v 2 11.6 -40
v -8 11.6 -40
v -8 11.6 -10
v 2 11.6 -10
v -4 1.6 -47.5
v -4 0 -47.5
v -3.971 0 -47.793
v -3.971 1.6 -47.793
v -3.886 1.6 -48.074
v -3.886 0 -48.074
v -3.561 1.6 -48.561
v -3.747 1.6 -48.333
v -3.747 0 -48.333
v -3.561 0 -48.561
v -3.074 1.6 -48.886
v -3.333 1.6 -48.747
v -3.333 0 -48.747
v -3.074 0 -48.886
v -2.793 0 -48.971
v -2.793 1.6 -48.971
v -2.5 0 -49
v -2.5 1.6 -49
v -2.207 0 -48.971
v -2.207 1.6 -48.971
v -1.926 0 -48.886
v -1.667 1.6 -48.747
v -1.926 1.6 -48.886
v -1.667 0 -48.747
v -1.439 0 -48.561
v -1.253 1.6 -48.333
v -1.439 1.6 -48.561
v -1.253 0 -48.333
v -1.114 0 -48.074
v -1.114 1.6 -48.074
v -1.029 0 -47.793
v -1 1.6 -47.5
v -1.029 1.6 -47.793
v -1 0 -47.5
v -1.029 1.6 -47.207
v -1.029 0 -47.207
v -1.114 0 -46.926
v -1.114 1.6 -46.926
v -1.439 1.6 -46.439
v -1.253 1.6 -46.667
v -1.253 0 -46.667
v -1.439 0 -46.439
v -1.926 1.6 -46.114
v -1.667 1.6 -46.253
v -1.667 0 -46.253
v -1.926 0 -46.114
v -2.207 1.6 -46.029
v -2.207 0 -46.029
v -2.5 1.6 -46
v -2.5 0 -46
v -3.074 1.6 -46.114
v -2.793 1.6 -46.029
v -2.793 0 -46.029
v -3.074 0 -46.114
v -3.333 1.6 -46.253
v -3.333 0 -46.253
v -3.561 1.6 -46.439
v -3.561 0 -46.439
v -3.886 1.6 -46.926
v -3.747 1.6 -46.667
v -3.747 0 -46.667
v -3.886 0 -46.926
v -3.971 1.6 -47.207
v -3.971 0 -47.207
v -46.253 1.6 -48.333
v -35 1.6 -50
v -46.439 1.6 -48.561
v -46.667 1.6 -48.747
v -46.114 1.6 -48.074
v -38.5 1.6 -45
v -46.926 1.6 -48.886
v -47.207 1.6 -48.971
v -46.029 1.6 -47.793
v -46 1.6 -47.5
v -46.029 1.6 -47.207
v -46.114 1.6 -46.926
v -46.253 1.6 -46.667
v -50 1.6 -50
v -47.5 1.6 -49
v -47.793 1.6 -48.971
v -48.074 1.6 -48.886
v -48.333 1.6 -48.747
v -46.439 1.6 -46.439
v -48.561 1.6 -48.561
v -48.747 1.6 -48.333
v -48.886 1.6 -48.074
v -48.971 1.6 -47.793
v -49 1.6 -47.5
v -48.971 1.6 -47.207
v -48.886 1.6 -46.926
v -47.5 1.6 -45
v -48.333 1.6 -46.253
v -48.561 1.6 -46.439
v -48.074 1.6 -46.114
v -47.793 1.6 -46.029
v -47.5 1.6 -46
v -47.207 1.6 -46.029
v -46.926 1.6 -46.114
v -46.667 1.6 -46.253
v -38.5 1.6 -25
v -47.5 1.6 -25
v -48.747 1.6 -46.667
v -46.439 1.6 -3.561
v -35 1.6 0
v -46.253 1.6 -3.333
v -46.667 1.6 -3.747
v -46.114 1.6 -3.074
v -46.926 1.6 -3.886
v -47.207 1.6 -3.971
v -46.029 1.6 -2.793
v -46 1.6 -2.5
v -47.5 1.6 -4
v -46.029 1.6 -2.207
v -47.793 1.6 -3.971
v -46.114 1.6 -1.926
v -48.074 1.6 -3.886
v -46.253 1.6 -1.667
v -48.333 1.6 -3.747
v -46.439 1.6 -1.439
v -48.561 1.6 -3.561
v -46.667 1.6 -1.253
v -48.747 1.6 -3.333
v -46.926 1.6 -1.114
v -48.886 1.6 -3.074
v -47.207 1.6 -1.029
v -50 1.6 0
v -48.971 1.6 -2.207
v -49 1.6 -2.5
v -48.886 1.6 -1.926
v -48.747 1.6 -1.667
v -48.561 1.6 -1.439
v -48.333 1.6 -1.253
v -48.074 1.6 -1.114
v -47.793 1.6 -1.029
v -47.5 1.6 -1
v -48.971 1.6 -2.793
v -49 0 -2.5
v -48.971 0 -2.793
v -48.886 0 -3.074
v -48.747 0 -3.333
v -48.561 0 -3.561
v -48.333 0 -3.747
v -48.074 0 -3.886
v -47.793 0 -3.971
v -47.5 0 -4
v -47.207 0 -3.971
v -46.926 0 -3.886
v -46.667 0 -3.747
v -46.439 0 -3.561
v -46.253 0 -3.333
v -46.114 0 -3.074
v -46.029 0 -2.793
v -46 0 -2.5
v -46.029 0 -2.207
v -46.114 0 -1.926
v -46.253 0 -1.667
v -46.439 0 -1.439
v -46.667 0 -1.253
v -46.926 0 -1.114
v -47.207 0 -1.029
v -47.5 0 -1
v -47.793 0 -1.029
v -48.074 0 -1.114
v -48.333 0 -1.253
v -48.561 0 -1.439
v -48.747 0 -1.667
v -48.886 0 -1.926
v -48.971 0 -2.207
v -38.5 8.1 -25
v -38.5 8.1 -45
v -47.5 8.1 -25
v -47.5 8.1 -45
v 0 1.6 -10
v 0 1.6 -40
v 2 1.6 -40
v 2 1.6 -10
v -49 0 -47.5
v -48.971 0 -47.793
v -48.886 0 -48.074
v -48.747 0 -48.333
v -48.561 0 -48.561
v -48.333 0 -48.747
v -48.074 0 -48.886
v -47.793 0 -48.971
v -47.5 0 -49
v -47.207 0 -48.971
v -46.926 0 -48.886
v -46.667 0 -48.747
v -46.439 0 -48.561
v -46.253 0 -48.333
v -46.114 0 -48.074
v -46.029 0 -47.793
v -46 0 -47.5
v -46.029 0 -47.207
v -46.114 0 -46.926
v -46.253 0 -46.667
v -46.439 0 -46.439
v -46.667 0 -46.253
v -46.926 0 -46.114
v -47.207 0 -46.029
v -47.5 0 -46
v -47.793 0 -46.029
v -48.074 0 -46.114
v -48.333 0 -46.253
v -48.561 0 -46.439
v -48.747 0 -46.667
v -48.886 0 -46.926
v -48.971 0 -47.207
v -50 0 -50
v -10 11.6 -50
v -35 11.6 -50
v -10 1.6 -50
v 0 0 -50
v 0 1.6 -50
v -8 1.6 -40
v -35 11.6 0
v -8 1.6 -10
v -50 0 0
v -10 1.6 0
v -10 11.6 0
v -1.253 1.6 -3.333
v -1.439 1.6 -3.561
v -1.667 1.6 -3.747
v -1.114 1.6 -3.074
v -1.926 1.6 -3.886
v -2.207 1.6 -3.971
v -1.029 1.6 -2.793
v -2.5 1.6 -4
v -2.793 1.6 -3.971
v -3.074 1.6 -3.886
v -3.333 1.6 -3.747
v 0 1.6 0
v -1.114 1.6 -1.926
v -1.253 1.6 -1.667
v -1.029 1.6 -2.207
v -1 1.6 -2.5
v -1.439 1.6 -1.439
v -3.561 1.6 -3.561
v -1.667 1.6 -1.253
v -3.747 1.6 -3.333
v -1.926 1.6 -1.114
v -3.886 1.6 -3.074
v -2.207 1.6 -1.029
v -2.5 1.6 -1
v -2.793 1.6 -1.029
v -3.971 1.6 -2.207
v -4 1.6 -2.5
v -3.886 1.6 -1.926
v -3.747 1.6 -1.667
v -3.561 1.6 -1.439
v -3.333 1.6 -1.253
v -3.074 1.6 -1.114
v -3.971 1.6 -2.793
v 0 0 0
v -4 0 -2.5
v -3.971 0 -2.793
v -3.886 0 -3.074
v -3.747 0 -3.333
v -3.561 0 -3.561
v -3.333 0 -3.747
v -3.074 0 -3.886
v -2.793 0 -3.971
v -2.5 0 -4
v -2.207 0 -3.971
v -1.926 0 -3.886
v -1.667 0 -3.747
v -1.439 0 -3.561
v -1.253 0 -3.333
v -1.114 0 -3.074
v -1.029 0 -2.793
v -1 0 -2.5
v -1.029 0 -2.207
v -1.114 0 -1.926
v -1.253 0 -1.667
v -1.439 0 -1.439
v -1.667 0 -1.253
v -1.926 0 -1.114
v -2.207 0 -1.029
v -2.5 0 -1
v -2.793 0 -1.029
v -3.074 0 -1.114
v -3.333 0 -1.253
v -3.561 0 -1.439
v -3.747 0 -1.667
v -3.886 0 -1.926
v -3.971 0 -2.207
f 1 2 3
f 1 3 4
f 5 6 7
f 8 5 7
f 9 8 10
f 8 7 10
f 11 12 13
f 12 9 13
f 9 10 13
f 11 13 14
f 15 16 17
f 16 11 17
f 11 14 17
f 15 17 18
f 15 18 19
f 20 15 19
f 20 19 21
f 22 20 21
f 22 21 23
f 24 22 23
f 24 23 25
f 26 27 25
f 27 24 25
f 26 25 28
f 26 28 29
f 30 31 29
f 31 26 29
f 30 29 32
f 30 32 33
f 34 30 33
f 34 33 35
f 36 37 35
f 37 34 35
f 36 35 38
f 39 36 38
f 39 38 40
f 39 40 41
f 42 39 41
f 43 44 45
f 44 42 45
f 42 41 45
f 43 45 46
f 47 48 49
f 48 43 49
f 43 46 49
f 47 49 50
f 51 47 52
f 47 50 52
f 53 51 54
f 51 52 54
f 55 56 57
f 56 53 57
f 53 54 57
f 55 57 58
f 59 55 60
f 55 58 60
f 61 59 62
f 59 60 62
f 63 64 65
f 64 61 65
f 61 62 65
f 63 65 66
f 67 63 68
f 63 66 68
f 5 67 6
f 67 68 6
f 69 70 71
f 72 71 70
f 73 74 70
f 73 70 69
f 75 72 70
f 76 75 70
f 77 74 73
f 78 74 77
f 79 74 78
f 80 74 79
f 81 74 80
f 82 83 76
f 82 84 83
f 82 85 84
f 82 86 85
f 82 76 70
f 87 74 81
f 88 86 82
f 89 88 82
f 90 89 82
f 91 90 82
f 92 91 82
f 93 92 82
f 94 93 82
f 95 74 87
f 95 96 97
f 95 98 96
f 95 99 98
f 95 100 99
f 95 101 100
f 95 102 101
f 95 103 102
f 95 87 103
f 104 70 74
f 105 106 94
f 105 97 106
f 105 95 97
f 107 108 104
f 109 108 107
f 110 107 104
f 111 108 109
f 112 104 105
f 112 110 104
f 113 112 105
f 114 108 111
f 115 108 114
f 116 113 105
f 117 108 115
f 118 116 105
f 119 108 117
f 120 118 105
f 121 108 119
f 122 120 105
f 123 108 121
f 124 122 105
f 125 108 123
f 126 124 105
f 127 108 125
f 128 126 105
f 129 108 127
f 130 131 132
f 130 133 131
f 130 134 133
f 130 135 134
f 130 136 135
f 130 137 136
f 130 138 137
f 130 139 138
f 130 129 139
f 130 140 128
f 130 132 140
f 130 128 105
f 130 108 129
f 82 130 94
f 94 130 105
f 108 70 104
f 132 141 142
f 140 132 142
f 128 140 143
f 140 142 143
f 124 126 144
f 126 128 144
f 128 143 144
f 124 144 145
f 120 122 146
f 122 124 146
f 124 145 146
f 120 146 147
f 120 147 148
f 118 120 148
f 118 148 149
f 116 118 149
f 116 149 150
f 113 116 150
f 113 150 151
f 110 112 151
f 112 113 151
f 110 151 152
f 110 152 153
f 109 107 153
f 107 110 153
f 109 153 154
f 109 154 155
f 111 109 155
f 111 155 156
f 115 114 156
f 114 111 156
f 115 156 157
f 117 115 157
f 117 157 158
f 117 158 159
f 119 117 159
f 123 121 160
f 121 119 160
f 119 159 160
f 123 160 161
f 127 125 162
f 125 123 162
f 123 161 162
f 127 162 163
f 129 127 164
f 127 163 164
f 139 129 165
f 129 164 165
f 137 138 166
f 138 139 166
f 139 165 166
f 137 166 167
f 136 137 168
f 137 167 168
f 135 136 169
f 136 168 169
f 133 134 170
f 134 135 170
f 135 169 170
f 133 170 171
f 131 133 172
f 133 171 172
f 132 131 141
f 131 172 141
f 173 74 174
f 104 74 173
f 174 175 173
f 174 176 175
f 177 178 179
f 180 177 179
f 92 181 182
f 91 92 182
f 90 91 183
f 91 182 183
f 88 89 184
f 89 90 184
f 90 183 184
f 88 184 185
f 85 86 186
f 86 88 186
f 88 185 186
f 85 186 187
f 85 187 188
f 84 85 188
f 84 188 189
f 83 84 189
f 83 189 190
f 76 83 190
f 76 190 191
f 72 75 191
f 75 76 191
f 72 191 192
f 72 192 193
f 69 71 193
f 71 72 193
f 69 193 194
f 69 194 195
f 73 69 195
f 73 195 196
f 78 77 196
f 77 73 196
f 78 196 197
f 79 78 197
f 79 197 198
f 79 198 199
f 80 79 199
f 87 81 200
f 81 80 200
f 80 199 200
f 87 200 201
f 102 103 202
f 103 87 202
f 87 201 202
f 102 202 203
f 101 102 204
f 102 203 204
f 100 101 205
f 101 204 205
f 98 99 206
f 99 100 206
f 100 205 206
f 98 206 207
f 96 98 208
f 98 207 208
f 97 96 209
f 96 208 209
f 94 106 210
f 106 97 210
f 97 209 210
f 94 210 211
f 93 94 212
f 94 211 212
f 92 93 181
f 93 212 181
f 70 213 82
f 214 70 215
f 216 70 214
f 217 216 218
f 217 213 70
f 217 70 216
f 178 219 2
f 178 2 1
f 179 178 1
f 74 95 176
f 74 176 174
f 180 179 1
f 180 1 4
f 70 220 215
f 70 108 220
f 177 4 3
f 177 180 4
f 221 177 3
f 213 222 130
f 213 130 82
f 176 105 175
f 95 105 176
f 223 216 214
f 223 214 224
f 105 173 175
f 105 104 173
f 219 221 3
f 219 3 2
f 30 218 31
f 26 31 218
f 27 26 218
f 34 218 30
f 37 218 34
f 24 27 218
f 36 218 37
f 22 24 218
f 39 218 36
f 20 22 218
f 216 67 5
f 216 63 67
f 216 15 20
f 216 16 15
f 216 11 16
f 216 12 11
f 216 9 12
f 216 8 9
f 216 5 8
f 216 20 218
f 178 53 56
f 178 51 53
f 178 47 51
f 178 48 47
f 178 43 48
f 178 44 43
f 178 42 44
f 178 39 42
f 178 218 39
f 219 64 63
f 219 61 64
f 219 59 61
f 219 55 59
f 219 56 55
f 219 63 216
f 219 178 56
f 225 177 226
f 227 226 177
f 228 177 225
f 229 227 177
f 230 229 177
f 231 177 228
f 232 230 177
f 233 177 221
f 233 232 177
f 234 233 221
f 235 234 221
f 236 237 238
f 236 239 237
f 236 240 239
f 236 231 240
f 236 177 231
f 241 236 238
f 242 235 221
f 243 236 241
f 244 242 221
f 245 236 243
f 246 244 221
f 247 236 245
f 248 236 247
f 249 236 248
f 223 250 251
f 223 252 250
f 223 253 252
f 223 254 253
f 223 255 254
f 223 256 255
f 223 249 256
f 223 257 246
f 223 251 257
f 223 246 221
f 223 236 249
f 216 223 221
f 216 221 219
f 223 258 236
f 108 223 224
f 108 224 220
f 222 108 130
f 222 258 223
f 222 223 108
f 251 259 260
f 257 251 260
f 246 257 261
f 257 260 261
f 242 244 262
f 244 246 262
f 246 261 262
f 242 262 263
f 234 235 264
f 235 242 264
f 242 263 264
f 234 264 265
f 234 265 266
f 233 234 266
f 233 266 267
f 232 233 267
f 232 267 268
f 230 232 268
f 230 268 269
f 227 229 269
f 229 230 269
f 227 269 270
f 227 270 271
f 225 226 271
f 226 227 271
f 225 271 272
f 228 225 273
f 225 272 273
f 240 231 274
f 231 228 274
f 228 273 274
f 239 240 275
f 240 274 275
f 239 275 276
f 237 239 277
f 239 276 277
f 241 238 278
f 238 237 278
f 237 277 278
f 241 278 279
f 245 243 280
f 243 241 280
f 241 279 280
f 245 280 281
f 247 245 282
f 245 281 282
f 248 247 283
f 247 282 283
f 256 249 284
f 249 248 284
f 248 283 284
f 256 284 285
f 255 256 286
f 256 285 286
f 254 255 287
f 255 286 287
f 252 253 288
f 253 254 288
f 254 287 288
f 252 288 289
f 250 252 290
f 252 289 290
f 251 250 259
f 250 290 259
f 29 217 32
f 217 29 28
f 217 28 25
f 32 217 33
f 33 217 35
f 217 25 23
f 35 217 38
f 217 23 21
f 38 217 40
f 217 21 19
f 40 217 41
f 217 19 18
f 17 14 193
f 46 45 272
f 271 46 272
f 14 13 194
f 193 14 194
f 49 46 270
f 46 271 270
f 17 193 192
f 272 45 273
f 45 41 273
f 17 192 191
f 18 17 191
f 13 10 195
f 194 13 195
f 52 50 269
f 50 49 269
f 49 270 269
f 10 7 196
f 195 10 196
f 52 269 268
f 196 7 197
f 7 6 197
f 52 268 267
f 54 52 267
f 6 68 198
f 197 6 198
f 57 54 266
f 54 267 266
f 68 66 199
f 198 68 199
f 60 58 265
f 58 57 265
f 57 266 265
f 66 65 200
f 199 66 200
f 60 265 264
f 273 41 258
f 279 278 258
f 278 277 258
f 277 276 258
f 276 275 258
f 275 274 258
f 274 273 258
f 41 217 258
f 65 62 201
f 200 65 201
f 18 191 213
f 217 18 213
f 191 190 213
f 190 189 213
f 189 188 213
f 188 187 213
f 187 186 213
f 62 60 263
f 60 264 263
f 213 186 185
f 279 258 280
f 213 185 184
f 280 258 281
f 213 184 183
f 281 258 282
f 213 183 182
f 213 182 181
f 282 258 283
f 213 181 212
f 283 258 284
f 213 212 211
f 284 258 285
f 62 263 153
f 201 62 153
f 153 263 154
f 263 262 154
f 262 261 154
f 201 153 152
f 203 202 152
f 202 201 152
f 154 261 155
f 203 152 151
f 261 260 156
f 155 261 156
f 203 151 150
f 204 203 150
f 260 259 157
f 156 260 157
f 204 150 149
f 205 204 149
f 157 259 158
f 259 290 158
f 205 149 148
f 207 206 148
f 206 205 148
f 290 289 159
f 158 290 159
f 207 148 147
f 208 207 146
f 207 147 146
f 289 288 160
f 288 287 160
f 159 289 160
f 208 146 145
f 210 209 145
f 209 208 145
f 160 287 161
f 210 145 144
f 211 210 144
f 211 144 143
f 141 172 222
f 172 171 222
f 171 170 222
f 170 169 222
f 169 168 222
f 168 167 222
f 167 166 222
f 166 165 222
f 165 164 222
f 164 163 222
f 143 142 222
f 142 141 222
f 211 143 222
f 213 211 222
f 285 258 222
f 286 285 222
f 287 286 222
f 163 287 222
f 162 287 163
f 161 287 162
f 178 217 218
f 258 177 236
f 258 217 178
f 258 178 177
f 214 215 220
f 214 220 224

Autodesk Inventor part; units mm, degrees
ref_plane "YZ Plane" through (0, 0, 0) normal (1, 0, 0) x (0, 1, 0)
ref_plane "XZ Plane" through (0, 0, 0) normal (0, 1, 0) x (-1, 0, 0)
ref_plane "XY Plane" through (0, 0, 0) normal (0, 0, 1) x (1, 0, 0)
sketch "Sketch1" plane through (0, 0, 0) normal (0, 1, 0) x (-1, 0, 0)
  line L0 (0, 0) -> (50, 0)
  line L1 (50, 0) -> (50, -50)
  line L2 (50, -50) -> (0, -50)
  line L3 (0, -50) -> (0, 0)
  circle A0 centre (47.5, -2.5) radius 1.5
  circle A1 centre (47.5, -47.5) radius 1.5
  circle A2 centre (2.5, -2.5) radius 1.5
  circle A3 centre (2.5, -47.5) radius 1.5
  dimension "d0" = 50
  dimension "d1" = 50
  dimension "d2" = 3
  dimension "d3" = 3
  dimension "d4" = 3
  dimension "d5" = 3
  dimension "d6" = 2.5
  dimension "d7" = 45
  dimension "d8" = 2.5
  dimension "d9" = 2.5
  dimension "d10" = 2.5
  dimension "d11" = 45
  dimension "d12" = 45
  dimension "d13" = 45
extrude "Extrusion1" add sketch "Sketch1" along normal blind 1.6
sketch "Sketch2" plane through (0, 1.6, 0) normal (0, 1, 0) x (1, 0, 0)
  line L0 (-10, 0) -> (-35, 0)
  line L1 (-35, 0) -> (-35, 50)
  line L2 (-35, 50) -> (-10, 50)
  line L3 (-10, 50) -> (-10, 0)
  line L4 (-50, 0) -> (0, 0) projected
  line L5 (0, 0) -> (0, 50) projected
  line L6 (2, 10) -> (-8, 10)
  line L7 (-8, 10) -> (-8, 40)
  line L8 (-8, 40) -> (2, 40)
  line L9 (2, 40) -> (2, 10)
  line L10 (-47.5, 45) -> (-38.5, 45)
  line L11 (-38.5, 45) -> (-38.5, 25)
  line L12 (-38.5, 25) -> (-47.5, 25)
  line L13 (-47.5, 25) -> (-47.5, 45)
  line L14 (-50, 50) -> (-50, 0) projected
  line L15 (0, 50) -> (-50, 50) projected
  point P0 (0, 40)
  point P1 (0, 10)
  dimension "d16" = 25
  dimension "d17" = 50
  dimension "d19" = 10
  dimension "d20" = 10
  dimension "d21" = 30
  dimension "d22" = 10
  dimension "d23" = 2
  dimension "d26" = 9
  dimension "d27" = 20
  dimension "d28" = 2.5
  dimension "d29" = 5
extrude "Extrusion2" add sketch "Sketch2" along normal blind 10 contours L0 L1 L2 L3 | L6 L7 L8 L5 | L5 L8 L9 L6
extrude "Extrusion3" add sketch "Sketch2" along normal blind 6.5 contours L10 L11 L12 L13
properties part number "motor_driver"
